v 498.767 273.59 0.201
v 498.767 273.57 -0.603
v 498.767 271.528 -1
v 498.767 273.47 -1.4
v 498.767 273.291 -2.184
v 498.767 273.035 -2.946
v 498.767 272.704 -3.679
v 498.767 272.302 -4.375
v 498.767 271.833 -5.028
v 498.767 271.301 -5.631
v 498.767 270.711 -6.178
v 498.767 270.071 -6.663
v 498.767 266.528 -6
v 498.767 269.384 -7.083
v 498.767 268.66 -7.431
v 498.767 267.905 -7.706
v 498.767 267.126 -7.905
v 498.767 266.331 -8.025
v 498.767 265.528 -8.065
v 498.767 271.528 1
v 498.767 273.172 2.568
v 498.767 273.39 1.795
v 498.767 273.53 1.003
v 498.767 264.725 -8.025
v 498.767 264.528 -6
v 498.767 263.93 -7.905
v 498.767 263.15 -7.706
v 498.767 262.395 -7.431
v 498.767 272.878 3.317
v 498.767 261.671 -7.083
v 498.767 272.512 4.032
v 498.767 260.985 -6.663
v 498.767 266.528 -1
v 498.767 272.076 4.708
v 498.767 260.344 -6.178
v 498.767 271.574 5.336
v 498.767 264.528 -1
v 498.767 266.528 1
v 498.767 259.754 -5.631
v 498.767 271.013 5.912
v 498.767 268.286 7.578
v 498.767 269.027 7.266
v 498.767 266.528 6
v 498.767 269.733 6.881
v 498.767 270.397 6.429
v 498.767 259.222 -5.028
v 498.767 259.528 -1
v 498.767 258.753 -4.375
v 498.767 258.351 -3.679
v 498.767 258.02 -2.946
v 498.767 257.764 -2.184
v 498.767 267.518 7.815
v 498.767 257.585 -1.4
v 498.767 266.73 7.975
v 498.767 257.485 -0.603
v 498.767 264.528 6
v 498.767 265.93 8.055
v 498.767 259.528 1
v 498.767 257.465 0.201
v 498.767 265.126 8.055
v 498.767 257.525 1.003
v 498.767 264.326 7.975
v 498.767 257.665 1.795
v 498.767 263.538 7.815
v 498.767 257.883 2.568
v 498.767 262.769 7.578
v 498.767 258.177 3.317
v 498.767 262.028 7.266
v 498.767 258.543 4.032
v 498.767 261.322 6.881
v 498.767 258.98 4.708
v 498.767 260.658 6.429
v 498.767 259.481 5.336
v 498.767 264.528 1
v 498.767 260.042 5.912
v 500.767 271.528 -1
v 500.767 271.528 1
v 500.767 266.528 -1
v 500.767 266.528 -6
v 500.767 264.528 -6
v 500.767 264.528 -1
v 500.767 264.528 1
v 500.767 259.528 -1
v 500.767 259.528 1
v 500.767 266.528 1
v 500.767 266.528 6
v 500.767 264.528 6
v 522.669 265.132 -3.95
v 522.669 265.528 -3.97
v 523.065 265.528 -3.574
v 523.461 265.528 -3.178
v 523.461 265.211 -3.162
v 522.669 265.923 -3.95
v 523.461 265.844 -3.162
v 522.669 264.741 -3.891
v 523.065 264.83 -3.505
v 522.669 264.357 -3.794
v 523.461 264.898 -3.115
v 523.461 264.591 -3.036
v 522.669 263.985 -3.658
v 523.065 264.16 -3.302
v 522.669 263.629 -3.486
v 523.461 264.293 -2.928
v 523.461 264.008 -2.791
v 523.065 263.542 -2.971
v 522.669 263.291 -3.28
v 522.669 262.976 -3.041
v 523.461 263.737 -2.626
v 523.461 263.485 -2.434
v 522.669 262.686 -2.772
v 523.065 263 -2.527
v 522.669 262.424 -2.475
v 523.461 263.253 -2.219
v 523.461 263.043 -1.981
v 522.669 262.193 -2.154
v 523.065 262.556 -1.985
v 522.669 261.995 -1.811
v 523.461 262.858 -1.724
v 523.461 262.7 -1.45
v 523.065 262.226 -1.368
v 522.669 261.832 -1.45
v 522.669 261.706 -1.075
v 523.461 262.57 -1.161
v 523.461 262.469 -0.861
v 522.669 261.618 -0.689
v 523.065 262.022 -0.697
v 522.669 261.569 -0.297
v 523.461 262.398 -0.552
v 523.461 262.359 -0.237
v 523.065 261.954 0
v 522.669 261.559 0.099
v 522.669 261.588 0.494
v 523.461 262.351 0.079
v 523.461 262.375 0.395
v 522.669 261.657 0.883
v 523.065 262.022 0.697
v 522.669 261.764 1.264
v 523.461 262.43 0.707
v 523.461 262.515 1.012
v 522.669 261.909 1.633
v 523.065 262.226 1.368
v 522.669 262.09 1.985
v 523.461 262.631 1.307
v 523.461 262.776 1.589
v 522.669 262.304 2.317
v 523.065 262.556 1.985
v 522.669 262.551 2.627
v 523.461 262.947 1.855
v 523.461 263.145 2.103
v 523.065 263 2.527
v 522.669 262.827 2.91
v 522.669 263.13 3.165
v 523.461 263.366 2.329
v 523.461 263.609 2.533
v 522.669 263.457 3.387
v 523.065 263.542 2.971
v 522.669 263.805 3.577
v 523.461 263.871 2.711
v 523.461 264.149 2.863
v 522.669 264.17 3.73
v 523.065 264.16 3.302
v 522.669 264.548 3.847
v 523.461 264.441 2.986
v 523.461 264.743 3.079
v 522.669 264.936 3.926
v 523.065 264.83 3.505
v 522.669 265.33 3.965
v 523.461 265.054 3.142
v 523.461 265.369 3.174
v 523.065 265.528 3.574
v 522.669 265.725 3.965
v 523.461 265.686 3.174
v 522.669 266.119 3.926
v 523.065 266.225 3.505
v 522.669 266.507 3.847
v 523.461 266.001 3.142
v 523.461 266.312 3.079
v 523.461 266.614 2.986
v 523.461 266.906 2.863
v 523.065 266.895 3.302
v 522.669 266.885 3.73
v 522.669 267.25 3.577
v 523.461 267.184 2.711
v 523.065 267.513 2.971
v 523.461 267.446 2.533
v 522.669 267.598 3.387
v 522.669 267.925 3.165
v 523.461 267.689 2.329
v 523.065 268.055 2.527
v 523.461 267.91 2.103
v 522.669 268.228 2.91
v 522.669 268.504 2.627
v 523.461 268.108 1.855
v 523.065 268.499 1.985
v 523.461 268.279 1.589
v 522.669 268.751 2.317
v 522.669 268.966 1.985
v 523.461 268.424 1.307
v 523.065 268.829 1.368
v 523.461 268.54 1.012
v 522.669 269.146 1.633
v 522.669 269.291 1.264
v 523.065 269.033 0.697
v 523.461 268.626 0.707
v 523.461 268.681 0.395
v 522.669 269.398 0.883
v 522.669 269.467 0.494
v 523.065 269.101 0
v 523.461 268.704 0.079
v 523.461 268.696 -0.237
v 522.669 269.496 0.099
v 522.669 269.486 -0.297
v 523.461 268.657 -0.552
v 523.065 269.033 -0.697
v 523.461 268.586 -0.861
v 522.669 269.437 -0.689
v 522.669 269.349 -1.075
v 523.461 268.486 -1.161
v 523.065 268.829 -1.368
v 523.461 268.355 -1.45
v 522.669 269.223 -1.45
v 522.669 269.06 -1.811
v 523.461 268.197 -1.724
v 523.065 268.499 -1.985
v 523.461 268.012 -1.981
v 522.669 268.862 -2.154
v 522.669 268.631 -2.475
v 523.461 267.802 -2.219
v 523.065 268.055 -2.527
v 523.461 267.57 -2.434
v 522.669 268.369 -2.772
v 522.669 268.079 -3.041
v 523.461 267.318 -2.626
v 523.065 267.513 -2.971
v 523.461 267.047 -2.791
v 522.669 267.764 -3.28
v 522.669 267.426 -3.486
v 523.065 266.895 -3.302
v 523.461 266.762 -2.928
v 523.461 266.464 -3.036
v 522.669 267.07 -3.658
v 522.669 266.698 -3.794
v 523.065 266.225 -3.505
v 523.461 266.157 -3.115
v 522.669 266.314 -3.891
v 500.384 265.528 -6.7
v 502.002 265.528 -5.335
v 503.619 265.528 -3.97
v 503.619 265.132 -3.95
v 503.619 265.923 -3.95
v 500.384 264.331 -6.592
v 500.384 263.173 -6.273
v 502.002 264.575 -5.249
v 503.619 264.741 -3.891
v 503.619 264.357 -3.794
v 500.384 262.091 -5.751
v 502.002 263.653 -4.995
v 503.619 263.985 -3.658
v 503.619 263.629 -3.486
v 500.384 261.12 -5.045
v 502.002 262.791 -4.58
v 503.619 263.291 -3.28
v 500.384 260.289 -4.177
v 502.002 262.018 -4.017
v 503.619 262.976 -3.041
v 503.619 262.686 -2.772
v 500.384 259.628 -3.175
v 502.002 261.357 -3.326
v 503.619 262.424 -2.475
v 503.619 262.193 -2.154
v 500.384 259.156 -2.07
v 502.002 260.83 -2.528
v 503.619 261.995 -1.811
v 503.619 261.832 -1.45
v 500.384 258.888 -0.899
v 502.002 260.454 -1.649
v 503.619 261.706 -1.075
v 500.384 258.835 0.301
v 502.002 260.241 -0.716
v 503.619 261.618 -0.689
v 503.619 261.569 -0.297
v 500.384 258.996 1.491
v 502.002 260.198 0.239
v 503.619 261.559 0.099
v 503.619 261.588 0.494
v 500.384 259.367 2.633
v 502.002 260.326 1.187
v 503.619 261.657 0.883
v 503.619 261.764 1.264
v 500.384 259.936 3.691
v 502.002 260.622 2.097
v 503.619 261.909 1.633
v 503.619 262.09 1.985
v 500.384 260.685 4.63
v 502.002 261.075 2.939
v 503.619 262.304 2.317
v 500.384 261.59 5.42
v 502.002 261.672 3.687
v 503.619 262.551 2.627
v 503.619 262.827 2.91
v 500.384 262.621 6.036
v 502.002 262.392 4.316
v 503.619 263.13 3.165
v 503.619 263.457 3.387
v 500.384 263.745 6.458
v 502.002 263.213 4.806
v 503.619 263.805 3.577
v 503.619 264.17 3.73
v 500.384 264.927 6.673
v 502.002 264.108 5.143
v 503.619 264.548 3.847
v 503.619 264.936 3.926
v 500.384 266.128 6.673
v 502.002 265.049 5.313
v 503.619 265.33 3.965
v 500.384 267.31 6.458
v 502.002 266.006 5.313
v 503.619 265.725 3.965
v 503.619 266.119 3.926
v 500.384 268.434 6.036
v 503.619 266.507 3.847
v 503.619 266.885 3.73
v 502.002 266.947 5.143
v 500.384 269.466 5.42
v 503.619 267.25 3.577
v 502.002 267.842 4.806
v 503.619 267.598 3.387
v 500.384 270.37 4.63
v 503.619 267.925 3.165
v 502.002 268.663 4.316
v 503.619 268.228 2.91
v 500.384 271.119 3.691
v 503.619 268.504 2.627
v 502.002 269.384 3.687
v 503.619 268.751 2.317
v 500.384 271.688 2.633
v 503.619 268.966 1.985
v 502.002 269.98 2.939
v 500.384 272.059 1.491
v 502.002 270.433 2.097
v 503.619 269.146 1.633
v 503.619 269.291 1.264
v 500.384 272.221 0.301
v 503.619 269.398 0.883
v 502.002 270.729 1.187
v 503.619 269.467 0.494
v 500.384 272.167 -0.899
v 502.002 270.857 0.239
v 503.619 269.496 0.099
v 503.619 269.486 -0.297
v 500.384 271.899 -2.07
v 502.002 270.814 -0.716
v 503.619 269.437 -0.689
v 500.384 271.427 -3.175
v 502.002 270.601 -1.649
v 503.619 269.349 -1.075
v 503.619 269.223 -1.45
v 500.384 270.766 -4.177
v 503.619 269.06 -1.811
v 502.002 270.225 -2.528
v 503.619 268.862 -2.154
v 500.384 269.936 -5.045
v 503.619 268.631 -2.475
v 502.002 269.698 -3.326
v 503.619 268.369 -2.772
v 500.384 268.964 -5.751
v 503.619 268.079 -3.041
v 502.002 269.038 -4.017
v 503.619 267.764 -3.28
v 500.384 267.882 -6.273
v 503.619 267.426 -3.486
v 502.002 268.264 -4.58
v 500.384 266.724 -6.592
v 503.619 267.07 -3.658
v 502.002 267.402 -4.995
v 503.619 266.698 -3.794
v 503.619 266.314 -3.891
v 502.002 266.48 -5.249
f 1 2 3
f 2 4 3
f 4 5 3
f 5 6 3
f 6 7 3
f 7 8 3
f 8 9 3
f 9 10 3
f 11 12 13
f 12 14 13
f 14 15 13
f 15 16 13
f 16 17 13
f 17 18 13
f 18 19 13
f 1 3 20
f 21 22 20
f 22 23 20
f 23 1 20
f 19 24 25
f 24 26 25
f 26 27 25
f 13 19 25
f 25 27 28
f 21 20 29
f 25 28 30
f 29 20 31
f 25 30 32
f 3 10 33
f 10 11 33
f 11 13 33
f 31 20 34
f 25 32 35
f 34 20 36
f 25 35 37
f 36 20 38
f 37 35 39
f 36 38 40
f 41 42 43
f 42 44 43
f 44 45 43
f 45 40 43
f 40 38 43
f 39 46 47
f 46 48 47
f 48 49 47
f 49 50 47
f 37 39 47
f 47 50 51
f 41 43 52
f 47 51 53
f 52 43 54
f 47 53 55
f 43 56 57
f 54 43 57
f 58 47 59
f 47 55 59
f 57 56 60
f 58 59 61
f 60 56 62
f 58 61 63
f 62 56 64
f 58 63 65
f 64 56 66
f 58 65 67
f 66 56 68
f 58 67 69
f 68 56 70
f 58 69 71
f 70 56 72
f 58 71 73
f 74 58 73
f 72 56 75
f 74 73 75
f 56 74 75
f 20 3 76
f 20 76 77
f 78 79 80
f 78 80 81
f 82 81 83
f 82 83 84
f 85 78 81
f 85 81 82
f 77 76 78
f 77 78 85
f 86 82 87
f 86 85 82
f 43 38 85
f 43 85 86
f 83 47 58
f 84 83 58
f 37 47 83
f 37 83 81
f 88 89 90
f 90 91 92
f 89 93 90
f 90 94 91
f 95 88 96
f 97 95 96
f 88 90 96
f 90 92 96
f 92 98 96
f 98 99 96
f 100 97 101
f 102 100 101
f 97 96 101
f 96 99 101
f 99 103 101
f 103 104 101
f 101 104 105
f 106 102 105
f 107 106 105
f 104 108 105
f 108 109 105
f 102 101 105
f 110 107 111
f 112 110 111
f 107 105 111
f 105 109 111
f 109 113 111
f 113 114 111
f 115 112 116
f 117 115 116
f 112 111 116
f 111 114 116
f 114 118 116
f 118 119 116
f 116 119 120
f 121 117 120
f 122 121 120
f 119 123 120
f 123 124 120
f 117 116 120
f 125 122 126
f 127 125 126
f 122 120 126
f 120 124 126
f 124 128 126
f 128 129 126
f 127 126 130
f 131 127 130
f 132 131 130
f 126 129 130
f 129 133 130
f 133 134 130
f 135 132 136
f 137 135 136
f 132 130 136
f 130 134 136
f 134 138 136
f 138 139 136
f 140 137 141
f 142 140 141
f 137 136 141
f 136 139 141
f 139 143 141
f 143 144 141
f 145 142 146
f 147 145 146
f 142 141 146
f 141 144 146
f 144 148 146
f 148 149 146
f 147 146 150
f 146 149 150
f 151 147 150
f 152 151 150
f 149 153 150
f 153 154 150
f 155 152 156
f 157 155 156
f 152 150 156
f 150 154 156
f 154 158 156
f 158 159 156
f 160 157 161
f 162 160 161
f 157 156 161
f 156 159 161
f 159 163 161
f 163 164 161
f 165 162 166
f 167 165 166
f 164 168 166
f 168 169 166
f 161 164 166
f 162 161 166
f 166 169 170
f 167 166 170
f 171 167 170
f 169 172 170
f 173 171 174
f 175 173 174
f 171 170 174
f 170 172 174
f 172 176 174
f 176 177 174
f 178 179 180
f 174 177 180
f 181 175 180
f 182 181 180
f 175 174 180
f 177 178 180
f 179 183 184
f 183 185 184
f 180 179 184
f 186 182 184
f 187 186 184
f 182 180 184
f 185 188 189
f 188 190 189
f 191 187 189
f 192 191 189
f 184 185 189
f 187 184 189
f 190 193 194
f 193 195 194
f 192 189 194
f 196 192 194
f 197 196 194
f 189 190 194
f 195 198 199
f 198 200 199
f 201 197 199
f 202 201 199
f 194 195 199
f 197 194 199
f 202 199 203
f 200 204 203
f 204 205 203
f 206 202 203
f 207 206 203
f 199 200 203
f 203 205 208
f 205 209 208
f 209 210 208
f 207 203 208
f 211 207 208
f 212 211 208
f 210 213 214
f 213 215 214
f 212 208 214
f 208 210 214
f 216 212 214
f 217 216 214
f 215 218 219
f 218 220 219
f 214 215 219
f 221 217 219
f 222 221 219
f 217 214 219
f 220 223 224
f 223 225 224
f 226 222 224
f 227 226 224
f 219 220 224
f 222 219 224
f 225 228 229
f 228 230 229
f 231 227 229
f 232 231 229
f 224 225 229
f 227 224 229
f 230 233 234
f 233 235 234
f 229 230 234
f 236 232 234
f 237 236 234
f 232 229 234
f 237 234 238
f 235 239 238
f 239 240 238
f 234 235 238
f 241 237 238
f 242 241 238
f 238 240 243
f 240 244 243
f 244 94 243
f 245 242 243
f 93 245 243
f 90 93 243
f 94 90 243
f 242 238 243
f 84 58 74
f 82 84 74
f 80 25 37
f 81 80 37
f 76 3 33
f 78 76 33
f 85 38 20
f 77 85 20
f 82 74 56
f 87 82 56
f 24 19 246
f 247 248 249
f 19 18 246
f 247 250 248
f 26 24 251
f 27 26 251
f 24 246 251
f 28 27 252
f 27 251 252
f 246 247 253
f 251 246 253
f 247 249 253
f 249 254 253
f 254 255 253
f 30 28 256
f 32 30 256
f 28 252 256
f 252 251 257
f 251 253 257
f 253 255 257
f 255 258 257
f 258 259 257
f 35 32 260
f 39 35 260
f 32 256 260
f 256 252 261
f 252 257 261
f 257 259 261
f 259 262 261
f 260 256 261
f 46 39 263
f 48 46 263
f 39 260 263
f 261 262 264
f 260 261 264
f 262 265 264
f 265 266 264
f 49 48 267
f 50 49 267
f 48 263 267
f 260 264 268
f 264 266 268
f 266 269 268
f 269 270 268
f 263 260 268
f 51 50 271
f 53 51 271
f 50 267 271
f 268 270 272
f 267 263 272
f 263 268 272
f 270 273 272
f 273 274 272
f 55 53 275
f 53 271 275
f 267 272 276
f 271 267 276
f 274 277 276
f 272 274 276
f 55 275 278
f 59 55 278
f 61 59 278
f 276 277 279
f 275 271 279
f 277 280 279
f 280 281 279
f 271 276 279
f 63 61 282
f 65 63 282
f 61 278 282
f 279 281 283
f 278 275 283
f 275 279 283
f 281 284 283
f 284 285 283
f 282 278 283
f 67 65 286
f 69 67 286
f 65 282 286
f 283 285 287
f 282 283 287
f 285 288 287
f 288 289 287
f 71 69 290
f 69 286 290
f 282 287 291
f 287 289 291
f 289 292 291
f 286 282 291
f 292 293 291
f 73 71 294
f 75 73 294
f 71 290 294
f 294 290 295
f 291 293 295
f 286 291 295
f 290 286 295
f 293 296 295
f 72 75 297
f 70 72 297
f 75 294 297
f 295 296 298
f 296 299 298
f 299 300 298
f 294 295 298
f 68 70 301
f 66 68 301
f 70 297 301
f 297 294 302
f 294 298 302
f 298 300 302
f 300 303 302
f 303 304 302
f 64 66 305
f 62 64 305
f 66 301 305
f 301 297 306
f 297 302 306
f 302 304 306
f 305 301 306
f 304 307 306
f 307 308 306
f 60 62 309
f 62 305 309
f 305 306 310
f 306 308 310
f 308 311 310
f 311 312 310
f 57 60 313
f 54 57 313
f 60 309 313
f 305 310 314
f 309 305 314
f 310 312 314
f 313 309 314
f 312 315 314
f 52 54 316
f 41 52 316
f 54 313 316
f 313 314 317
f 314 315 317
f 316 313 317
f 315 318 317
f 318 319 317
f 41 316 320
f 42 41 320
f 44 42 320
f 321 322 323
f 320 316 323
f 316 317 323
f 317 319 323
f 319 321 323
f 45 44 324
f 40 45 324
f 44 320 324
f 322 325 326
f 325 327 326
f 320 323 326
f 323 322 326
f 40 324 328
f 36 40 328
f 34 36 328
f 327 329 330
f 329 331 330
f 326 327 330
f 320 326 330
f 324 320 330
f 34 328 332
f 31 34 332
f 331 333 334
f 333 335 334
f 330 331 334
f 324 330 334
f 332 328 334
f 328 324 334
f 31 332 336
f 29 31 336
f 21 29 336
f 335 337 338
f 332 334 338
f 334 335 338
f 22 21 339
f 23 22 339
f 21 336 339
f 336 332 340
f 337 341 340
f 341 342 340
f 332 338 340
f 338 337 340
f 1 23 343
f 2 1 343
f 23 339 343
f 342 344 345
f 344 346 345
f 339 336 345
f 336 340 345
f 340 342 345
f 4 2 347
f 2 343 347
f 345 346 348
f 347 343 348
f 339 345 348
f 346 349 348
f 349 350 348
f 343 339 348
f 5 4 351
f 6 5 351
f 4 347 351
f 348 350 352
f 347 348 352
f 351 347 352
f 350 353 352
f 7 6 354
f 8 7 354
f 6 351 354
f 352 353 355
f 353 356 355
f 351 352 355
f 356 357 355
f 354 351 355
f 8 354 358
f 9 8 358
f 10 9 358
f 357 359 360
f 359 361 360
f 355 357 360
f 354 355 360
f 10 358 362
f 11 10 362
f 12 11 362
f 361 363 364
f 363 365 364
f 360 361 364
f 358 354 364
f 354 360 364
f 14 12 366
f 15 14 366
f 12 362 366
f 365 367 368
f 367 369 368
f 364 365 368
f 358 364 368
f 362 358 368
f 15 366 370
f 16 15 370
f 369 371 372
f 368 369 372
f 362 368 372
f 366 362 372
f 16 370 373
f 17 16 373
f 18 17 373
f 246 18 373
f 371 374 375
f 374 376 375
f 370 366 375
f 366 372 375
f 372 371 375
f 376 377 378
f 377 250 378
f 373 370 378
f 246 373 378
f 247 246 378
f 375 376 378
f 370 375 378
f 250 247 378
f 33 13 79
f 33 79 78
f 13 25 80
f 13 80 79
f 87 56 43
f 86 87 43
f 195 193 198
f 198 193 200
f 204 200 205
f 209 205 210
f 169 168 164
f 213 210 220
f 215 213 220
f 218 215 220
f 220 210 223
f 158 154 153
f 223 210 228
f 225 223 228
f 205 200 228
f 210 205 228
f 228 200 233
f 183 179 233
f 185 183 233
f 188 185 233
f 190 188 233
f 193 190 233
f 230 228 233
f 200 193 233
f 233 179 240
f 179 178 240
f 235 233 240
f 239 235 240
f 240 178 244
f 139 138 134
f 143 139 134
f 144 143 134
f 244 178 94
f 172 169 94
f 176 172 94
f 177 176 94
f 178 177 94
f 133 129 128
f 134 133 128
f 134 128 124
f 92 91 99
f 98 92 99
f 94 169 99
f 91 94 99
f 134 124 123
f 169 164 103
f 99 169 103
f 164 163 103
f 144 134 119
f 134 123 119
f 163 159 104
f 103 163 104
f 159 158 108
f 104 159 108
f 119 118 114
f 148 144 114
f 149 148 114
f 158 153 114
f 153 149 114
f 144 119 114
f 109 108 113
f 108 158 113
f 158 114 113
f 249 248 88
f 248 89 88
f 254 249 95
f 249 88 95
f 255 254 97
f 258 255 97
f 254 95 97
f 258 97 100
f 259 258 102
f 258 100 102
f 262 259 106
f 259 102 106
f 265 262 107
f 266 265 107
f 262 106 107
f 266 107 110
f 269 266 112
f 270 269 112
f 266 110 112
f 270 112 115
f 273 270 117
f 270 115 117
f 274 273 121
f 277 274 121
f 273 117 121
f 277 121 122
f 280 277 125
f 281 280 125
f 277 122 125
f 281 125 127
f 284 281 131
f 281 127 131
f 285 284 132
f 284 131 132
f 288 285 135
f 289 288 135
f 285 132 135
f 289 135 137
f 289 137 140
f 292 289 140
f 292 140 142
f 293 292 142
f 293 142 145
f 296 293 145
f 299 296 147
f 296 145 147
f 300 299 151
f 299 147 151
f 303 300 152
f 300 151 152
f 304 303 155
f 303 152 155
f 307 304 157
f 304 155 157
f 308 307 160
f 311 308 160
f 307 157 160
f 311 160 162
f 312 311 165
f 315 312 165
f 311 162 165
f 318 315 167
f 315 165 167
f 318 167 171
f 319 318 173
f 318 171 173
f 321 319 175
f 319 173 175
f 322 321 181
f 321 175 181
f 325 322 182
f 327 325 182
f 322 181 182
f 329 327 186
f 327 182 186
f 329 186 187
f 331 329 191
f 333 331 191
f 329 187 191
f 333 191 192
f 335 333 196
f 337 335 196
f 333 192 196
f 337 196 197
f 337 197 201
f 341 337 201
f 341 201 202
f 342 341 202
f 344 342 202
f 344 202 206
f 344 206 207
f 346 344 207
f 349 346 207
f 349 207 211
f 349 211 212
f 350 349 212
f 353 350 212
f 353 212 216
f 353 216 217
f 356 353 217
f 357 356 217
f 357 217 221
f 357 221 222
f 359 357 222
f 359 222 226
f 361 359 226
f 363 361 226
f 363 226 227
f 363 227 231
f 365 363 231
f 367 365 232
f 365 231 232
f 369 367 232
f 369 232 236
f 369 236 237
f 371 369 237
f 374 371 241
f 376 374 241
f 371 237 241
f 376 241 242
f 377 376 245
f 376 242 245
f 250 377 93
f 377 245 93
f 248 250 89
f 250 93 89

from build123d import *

# Parameters (mm, degrees)
CUT_EXTRUDE1_DEPTH = 2


with BuildPart() as part:
    # Sketch1 → Revolve1 (revolve)
    with BuildSketch(Plane.XY):
        Polygon((522.668754, 269.497429), (523.461488, 268.705203), (523.461488, 265.527536), (498.7671, 265.527536), (498.7671, 273.592163), (503.618754, 269.497429), align=None)
    revolve(axis=Axis((523.461488, 265.527536, 0), (-1, 0, 0)))

    # Sketch2 → Cut-Extrude1 (cut)
    with BuildSketch(Plane.ZY.offset(-498.7671)):
        Polygon((-1, 266.527536), (-6, 266.527536), (-6, 264.527536), (-1, 264.527536), (-1, 259.527536), (1, 259.527536), (1, 264.527536), (6, 264.527536), (6, 266.527536), (1, 266.527536), (1, 271.527536), (-1, 271.527536), align=None)
    extrude(amount=-CUT_EXTRUDE1_DEPTH, mode=Mode.SUBTRACT)


solid = part.part
